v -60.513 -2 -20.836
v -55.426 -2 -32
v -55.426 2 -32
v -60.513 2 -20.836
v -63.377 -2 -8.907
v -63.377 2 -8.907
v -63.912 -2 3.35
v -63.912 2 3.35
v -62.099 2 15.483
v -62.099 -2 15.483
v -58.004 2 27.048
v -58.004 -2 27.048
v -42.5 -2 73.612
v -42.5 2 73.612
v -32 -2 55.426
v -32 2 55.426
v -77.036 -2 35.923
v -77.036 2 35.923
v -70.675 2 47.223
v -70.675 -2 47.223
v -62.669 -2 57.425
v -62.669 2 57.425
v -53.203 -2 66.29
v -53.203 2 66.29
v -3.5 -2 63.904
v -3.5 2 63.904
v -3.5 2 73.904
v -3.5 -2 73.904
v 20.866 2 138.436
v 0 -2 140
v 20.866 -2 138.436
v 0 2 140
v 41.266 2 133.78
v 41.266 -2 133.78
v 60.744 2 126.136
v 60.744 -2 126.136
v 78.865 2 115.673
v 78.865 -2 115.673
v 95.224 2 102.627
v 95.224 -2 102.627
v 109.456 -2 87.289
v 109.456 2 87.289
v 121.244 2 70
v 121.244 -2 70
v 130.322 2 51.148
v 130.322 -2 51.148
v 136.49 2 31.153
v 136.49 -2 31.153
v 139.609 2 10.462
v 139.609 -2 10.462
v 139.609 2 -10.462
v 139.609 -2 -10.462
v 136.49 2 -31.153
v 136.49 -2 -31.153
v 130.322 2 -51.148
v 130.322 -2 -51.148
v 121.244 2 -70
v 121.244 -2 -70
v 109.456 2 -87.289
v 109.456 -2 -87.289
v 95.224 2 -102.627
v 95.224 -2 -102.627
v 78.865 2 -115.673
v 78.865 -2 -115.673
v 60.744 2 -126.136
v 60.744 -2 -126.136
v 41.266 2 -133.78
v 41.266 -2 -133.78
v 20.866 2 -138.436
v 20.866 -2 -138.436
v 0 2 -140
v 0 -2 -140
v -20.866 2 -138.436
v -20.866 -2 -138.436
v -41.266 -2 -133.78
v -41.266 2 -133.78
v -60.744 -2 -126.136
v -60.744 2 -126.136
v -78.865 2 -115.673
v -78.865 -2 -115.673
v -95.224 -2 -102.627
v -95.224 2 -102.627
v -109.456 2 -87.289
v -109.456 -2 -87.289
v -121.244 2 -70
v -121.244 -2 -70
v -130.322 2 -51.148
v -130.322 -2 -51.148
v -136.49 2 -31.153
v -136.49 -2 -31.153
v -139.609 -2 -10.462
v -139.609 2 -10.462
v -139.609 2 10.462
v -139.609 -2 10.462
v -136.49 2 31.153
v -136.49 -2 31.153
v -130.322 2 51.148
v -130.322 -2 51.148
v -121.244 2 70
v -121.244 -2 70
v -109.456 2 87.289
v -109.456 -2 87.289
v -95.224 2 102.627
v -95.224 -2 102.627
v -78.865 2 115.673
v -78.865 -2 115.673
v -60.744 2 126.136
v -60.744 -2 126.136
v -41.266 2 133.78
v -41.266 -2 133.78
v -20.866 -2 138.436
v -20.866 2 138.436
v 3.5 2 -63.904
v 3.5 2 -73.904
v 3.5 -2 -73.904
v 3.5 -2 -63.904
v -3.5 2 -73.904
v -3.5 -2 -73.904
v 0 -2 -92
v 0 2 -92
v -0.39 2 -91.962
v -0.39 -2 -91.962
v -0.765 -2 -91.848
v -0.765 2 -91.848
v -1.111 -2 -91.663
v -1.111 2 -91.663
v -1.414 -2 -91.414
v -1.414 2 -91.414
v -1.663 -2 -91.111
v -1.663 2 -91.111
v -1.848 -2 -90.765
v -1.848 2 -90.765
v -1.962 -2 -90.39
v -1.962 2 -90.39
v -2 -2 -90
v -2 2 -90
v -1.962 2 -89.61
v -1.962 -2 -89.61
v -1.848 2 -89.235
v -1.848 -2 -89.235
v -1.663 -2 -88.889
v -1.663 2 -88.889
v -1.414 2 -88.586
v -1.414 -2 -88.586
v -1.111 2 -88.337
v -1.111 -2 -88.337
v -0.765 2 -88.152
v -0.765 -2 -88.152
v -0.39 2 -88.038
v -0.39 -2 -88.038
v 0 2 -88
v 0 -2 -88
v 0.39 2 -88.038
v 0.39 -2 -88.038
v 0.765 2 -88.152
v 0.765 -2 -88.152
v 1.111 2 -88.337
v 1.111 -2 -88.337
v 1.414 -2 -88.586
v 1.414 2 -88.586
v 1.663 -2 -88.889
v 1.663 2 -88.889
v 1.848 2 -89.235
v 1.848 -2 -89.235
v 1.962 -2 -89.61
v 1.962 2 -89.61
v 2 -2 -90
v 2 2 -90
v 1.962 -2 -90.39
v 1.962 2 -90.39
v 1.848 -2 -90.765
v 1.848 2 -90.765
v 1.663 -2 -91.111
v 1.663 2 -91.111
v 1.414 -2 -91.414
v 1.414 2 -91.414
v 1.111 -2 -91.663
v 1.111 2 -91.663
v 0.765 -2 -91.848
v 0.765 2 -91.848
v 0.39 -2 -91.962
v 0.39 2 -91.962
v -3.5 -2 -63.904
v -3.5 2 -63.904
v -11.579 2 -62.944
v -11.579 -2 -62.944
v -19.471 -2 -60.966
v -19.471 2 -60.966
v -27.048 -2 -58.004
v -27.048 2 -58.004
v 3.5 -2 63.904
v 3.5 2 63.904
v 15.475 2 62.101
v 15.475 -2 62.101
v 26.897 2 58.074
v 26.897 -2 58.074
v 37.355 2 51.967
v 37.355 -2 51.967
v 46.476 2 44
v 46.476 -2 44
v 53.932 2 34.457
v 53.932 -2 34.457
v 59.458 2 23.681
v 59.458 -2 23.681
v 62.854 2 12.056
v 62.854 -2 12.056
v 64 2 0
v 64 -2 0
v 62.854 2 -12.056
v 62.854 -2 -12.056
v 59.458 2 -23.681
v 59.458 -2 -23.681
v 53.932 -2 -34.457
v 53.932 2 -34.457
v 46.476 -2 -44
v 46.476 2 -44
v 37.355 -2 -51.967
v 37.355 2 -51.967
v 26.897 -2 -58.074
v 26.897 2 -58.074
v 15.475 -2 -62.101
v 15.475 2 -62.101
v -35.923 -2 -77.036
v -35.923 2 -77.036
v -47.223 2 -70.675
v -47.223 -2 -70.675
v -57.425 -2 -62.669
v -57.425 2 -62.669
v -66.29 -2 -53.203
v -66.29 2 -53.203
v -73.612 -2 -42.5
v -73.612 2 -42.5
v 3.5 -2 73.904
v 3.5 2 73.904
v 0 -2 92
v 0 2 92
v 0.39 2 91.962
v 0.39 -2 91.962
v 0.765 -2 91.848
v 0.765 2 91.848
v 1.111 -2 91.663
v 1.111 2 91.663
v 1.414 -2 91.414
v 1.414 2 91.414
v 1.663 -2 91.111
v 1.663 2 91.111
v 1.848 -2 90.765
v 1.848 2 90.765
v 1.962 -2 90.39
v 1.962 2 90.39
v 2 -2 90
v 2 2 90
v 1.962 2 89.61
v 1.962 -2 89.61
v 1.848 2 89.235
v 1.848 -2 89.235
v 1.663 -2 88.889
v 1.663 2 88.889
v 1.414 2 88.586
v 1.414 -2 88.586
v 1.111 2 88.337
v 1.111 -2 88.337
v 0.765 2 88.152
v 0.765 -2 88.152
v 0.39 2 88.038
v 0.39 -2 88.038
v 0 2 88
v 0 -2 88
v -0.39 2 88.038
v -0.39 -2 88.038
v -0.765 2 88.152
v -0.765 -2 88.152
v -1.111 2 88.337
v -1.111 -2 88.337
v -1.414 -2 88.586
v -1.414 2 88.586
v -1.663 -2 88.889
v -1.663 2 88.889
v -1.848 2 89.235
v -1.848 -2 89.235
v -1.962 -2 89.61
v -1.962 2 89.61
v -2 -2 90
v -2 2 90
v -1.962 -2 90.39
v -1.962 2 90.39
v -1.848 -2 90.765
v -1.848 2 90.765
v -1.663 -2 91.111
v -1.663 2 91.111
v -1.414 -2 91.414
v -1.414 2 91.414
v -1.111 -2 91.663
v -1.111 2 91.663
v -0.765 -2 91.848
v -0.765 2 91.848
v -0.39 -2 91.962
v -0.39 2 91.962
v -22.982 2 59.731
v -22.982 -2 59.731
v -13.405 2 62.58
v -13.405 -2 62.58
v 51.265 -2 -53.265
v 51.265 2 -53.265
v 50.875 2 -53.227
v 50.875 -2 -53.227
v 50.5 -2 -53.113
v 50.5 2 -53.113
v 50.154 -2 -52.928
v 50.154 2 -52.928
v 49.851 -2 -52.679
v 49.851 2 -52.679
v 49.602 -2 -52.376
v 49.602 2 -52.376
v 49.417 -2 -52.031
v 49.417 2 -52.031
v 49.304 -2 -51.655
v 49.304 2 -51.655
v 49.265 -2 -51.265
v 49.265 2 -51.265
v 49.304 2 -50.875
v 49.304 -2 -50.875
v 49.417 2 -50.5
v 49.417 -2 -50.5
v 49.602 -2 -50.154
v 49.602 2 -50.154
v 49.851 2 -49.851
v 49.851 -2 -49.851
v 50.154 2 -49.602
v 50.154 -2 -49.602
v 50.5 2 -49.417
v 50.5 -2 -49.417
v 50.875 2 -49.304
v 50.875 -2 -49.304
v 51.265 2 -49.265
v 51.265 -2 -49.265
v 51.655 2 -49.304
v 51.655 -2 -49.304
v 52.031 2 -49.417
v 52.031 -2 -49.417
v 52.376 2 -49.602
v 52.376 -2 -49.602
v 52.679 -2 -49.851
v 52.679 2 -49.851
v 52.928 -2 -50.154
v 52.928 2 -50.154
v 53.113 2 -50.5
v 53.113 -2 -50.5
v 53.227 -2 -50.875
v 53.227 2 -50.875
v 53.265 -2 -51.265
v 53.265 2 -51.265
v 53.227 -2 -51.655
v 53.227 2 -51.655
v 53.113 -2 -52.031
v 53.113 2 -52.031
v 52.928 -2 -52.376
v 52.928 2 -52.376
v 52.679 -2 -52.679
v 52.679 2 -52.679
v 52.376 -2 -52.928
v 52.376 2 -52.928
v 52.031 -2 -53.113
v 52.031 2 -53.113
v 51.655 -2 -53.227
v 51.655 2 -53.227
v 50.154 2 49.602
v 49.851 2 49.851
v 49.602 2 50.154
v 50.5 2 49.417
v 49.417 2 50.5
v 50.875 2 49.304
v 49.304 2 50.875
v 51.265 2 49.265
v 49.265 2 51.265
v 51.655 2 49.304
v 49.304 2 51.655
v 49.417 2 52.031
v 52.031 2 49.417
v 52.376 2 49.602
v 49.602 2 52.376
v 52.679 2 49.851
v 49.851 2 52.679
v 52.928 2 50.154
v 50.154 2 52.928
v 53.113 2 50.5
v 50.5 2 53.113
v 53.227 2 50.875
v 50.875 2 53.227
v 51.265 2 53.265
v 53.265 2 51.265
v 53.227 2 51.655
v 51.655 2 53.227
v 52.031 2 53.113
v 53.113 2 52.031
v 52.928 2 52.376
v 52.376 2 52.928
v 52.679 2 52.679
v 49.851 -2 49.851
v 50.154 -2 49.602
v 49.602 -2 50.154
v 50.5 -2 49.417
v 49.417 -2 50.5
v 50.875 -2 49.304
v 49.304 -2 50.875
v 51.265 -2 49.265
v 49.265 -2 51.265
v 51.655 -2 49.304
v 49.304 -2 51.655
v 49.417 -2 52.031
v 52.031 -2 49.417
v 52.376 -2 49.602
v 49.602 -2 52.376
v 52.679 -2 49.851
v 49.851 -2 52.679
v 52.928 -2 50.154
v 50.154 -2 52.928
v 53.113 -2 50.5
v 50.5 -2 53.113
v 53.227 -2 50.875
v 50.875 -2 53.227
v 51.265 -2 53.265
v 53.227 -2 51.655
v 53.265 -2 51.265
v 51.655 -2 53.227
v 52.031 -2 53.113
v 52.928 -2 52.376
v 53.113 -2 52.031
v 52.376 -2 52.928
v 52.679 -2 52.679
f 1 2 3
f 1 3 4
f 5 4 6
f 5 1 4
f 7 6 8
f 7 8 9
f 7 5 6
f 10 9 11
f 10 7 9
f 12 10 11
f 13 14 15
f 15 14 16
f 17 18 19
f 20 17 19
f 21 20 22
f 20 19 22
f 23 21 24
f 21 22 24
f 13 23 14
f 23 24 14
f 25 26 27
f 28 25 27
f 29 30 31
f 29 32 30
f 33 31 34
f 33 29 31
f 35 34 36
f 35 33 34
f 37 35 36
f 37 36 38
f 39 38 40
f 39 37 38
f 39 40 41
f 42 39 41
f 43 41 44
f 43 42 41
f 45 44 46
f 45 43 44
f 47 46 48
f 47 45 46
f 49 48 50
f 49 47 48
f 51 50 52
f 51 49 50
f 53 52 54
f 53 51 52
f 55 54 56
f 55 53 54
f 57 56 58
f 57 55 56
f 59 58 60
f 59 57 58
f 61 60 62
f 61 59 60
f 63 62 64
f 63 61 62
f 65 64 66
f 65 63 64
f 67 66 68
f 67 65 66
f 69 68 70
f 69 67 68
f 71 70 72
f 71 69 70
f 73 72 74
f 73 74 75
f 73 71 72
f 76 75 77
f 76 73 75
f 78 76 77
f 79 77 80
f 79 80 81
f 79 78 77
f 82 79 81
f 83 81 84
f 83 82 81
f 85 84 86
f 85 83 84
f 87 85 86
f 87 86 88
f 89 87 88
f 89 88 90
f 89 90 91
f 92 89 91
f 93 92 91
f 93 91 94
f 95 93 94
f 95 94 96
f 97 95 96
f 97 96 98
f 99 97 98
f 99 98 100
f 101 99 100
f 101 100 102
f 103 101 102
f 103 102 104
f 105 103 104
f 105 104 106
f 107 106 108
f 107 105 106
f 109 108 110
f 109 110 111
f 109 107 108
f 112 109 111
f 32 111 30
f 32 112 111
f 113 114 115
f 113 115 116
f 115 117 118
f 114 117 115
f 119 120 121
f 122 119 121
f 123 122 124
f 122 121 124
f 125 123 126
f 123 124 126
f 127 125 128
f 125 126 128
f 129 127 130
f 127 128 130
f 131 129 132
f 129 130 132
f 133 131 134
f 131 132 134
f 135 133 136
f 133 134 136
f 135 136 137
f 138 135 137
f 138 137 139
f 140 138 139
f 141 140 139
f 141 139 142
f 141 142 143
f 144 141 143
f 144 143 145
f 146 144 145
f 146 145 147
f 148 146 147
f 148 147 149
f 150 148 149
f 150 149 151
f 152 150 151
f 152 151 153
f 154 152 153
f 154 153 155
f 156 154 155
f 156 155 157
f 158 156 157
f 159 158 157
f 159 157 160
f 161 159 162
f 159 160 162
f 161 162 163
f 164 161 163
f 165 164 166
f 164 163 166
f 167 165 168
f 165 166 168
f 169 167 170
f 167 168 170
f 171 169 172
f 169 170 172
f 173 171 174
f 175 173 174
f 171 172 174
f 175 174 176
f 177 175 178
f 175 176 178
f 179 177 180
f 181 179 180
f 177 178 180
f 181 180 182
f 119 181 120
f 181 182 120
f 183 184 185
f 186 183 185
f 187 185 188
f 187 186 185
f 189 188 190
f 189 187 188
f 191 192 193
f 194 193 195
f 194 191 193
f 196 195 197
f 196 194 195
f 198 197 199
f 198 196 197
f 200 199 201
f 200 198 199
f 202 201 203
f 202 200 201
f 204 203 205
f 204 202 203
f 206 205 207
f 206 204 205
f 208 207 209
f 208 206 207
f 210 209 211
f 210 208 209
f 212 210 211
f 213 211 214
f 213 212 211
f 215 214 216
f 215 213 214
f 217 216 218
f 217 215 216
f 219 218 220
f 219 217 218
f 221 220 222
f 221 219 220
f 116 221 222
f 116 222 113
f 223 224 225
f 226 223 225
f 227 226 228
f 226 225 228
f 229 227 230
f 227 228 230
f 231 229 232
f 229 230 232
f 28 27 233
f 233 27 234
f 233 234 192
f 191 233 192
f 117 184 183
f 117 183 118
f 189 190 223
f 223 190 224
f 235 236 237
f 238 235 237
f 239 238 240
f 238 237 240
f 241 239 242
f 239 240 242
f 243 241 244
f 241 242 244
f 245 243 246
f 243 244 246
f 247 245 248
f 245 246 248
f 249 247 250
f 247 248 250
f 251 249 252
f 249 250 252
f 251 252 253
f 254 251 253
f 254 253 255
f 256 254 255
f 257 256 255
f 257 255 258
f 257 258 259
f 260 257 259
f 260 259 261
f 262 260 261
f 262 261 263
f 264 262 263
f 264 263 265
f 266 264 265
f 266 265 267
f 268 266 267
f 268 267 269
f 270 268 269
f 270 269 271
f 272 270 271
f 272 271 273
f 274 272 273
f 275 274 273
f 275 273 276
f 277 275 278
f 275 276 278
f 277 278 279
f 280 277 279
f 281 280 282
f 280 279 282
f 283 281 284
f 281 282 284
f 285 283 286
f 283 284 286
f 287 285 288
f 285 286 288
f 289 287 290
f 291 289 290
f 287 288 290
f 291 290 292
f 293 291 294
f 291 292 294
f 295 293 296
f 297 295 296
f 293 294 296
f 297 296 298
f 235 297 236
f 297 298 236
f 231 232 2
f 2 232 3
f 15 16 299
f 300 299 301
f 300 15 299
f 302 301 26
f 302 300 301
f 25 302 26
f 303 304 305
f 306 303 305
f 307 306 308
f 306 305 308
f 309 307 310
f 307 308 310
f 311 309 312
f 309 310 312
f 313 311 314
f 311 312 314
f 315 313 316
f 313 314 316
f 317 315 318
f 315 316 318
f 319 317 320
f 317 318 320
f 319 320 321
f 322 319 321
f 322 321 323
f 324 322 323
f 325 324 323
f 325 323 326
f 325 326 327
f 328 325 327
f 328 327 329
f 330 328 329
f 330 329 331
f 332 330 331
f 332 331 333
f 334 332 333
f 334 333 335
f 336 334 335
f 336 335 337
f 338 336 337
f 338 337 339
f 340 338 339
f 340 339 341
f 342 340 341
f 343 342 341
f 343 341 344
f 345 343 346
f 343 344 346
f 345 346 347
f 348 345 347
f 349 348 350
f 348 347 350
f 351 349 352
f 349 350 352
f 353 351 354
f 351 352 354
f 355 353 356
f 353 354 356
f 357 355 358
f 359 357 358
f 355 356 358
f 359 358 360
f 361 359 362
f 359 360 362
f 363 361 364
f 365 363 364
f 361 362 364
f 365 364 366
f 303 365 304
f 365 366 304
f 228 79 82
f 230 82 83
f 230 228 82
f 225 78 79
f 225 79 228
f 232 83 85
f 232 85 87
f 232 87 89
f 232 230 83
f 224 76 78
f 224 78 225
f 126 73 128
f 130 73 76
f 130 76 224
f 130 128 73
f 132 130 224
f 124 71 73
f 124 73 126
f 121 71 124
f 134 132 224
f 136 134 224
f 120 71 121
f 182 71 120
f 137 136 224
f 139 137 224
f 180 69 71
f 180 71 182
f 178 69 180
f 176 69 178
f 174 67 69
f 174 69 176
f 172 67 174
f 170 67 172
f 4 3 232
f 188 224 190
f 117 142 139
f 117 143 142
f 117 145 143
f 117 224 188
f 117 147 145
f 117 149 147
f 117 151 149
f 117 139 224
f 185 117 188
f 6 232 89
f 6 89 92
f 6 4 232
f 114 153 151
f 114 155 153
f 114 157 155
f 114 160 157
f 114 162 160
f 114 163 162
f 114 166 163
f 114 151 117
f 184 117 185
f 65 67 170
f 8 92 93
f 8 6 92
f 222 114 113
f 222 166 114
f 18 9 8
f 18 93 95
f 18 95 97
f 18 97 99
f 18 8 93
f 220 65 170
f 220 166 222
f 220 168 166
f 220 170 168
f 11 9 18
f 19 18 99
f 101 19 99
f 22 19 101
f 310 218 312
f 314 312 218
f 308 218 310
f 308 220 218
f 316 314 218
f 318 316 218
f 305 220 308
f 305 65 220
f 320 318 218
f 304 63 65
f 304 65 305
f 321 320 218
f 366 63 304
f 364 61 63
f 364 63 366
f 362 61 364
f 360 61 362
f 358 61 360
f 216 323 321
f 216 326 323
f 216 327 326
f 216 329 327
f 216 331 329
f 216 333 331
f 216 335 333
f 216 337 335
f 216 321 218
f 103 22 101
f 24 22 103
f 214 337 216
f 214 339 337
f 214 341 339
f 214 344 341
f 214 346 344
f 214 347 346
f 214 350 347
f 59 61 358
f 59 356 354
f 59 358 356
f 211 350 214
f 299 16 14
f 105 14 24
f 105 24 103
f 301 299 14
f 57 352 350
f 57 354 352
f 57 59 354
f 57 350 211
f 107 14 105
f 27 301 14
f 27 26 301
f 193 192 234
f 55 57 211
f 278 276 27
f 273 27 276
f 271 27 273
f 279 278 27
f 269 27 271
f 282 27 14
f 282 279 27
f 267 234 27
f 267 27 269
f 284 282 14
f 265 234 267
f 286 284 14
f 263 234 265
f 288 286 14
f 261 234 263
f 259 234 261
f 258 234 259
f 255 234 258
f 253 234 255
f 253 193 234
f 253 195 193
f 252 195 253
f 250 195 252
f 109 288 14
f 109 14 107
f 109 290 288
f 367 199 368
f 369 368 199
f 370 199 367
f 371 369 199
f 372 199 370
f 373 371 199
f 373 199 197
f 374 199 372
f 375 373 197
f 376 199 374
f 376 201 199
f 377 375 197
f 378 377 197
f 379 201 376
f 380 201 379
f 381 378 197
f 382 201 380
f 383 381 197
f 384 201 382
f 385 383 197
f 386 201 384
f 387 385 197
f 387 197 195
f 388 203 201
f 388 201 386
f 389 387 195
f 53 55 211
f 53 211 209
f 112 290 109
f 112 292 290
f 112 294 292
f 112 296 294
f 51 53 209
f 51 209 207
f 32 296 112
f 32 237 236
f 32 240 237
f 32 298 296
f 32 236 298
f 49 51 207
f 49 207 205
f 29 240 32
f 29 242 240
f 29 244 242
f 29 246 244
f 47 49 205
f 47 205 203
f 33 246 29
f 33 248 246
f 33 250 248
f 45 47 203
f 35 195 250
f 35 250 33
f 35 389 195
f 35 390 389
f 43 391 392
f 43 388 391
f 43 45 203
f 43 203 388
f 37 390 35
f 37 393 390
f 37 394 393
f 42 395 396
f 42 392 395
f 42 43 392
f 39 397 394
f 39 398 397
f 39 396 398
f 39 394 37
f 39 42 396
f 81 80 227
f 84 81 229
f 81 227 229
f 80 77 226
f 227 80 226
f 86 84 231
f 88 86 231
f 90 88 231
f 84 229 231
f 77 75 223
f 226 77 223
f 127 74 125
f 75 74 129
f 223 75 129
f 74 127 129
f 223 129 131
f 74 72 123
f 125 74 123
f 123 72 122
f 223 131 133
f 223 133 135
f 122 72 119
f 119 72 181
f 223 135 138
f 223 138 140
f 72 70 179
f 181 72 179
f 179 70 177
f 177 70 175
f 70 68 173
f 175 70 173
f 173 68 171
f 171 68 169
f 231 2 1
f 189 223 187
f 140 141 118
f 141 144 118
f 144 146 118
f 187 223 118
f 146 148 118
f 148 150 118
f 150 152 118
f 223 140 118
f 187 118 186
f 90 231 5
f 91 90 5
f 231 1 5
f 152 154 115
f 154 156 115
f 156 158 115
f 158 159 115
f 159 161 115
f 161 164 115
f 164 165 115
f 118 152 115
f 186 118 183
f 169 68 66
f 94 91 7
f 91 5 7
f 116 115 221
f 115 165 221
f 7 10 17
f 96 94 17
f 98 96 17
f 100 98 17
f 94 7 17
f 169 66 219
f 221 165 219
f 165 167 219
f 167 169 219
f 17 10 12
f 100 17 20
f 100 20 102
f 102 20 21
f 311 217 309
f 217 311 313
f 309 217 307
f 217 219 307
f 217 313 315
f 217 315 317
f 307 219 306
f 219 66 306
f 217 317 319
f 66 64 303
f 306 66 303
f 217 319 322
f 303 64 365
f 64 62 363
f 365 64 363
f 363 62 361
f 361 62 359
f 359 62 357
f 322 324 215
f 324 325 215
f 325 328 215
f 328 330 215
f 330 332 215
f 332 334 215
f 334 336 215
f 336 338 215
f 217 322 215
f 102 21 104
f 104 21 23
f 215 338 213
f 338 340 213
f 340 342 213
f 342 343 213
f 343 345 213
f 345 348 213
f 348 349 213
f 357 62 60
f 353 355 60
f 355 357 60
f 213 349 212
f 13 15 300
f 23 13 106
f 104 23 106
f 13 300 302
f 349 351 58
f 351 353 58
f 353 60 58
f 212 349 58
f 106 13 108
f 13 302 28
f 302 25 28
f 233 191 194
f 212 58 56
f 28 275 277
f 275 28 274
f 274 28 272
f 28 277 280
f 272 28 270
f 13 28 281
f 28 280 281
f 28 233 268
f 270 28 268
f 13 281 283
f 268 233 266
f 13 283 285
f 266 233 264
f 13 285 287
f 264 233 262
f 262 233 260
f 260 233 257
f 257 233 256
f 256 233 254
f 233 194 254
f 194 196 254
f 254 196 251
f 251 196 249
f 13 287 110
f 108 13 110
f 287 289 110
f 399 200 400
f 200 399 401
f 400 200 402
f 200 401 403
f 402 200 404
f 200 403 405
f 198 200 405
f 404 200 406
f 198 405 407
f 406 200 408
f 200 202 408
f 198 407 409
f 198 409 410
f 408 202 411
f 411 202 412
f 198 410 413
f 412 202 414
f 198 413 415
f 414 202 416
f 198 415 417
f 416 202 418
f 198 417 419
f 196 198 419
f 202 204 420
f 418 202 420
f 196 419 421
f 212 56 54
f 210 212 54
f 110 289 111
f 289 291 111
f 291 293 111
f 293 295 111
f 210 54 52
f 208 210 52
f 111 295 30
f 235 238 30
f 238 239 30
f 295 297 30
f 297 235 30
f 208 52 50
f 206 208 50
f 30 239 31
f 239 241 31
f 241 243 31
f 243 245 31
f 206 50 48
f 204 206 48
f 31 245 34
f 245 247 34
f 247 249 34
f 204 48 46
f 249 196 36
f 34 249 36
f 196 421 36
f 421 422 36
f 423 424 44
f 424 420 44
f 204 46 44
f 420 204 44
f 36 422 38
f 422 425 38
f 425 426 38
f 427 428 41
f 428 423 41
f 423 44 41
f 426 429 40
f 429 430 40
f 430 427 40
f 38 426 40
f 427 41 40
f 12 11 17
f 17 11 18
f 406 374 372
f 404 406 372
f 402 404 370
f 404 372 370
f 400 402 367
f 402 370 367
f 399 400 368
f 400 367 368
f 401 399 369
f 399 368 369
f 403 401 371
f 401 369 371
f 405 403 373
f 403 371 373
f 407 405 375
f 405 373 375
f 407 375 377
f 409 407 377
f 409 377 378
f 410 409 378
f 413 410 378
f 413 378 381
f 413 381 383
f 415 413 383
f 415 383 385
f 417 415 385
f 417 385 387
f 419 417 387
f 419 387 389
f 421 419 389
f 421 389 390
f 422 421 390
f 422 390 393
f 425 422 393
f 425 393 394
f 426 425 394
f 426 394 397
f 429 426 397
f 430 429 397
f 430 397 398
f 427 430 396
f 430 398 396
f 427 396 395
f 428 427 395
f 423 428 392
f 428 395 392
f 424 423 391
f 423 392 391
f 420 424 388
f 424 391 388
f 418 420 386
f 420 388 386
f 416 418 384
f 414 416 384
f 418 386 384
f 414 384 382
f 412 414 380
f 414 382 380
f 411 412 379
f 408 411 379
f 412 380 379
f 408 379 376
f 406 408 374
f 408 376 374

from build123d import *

# Parameters (mm, degrees)
SKETCH1_R           = 140
SKETCH1_R_2         = 64
BOSS_EXTRUDE1_DEPTH = 2
CUT_EXTRUDE1_DEPTH  = 199.030300712
SKETCH4_R           = 2
CUT_EXTRUDE2_DEPTH  = 199.030300712
SKETCH5_R           = 2
CUT_EXTRUDE3_DEPTH  = 199.030300712
SKETCH6_R           = 2
CUT_EXTRUDE4_DEPTH  = 199.030300712
CUT_EXTRUDE6_DEPTH  = 199.030300712


with BuildPart() as part:
    # Sketch1 → Boss-Extrude1 (new, symmetric)
    with BuildSketch(Plane(origin=(0, 0, 0), x_dir=(1, 0, 0), z_dir=(0, 1, 0))):
        with Locations(Location((0, 0, 0), (0, 0, 270))):
            Circle(SKETCH1_R)
        with Locations(Location((0, 0, 0), (0, 0, 270))):
            Circle(SKETCH1_R_2, mode=Mode.SUBTRACT)
    extrude(amount=BOSS_EXTRUDE1_DEPTH, both=True)

    # Sketch2 → Cut-Extrude1 (cut, through all)
    with BuildSketch(Plane(origin=(0, 2, 0), x_dir=(1, 0, 0), z_dir=(0, 1, 0))):
        with BuildLine():
            Line((-3.5, 73.904225212), (0, 73.904225212))
            Line((0, 73.904225212), (3.5, 73.904225212))
            Line((3.5, 73.904225212), (3.5, 63.904225212))
            ThreePointArc((3.5, 63.904225212), (0, 64), (-3.5, 63.904225212))
            Line((-3.5, 63.904225212), (-3.5, 73.904225212))
        make_face()
        with BuildLine():
            Line((3.5, -73.904225212), (3.5, -63.904225212))
            ThreePointArc((3.5, -63.904225212), (0, -64), (-3.5, -63.904225212))
            Line((-3.5, -63.904225212), (-3.5, -73.904225212))
            Line((-3.5, -73.904225212), (0, -73.904225212))
            Line((0, -73.904225212), (3.5, -73.904225212))
        make_face()
    extrude(amount=-CUT_EXTRUDE1_DEPTH, mode=Mode.SUBTRACT)

    # Sketch4 → Cut-Extrude2 (cut, through all)
    with BuildSketch(Plane(origin=(0, 2, 0), x_dir=(1, 0, 0), z_dir=(0, 1, 0))):
        with Locations(Location((-51.265241636, 51.265241636, 0), (0, 0, 270))):
            Circle(SKETCH4_R)
        with Locations(Location((51.265241636, -51.265241636, 0), (0, 0, 90))):
            Circle(SKETCH4_R)
    extrude(amount=-CUT_EXTRUDE2_DEPTH, mode=Mode.SUBTRACT)

    # Sketch5 → Cut-Extrude3 (cut, through all)
    with BuildSketch(Plane(origin=(0, 2, 0), x_dir=(1, 0, 0), z_dir=(0, 1, 0))):
        with Locations(Location((0, -90, 0), (0, 0, 270))):
            Circle(SKETCH5_R)
        with Locations(Location((0, 90, 0), (0, 0, 90))):
            Circle(SKETCH5_R)
    extrude(amount=-CUT_EXTRUDE3_DEPTH, mode=Mode.SUBTRACT)

    # Sketch6 → Cut-Extrude4 (cut, through all)
    with BuildSketch(Plane(origin=(0, 2, 0), x_dir=(1, 0, 0), z_dir=(0, 1, 0))):
        with Locations(Location((-51.265241636, -51.265241636, 0), (0, 0, 270))):
            Circle(SKETCH6_R)
        with Locations(Location((51.265241636, 51.265241636, 0), (0, 0, 90))):
            Circle(SKETCH6_R)
    extrude(amount=-CUT_EXTRUDE4_DEPTH, mode=Mode.SUBTRACT)

    # Sketch7 → Cut-Extrude6 (cut, through all)
    with BuildSketch(Plane(origin=(0, 2, 0), x_dir=(1, 0, 0), z_dir=(0, 1, 0))):
        with BuildLine():
            Line((-27.047568751, 58.00369837), (-35.922552248, 77.036161898))
            ThreePointArc((-35.922552248, 77.036161898), (-57.425167647, 62.668573629), (-73.612159322, 42.5))
            Line((-73.612159322, 42.5), (-55.425625842, 32))
            ThreePointArc((-55.425625842, 32), (-43.237773287, 47.185749556), (-27.047568751, 58.00369837))
        make_face()
        with BuildLine():
            Line((-58.00369837, -27.047568751), (-77.036161898, -35.922552248))
            ThreePointArc((-77.036161898, -35.922552248), (-62.668573629, -57.425167647), (-42.5, -73.612159322))
            Line((-42.5, -73.612159322), (-32, -55.425625842))
            ThreePointArc((-32, -55.425625842), (-47.185749556, -43.237773287), (-58.00369837, -27.047568751))
        make_face()
    extrude(amount=-CUT_EXTRUDE6_DEPTH, mode=Mode.SUBTRACT)


solid = part.part
